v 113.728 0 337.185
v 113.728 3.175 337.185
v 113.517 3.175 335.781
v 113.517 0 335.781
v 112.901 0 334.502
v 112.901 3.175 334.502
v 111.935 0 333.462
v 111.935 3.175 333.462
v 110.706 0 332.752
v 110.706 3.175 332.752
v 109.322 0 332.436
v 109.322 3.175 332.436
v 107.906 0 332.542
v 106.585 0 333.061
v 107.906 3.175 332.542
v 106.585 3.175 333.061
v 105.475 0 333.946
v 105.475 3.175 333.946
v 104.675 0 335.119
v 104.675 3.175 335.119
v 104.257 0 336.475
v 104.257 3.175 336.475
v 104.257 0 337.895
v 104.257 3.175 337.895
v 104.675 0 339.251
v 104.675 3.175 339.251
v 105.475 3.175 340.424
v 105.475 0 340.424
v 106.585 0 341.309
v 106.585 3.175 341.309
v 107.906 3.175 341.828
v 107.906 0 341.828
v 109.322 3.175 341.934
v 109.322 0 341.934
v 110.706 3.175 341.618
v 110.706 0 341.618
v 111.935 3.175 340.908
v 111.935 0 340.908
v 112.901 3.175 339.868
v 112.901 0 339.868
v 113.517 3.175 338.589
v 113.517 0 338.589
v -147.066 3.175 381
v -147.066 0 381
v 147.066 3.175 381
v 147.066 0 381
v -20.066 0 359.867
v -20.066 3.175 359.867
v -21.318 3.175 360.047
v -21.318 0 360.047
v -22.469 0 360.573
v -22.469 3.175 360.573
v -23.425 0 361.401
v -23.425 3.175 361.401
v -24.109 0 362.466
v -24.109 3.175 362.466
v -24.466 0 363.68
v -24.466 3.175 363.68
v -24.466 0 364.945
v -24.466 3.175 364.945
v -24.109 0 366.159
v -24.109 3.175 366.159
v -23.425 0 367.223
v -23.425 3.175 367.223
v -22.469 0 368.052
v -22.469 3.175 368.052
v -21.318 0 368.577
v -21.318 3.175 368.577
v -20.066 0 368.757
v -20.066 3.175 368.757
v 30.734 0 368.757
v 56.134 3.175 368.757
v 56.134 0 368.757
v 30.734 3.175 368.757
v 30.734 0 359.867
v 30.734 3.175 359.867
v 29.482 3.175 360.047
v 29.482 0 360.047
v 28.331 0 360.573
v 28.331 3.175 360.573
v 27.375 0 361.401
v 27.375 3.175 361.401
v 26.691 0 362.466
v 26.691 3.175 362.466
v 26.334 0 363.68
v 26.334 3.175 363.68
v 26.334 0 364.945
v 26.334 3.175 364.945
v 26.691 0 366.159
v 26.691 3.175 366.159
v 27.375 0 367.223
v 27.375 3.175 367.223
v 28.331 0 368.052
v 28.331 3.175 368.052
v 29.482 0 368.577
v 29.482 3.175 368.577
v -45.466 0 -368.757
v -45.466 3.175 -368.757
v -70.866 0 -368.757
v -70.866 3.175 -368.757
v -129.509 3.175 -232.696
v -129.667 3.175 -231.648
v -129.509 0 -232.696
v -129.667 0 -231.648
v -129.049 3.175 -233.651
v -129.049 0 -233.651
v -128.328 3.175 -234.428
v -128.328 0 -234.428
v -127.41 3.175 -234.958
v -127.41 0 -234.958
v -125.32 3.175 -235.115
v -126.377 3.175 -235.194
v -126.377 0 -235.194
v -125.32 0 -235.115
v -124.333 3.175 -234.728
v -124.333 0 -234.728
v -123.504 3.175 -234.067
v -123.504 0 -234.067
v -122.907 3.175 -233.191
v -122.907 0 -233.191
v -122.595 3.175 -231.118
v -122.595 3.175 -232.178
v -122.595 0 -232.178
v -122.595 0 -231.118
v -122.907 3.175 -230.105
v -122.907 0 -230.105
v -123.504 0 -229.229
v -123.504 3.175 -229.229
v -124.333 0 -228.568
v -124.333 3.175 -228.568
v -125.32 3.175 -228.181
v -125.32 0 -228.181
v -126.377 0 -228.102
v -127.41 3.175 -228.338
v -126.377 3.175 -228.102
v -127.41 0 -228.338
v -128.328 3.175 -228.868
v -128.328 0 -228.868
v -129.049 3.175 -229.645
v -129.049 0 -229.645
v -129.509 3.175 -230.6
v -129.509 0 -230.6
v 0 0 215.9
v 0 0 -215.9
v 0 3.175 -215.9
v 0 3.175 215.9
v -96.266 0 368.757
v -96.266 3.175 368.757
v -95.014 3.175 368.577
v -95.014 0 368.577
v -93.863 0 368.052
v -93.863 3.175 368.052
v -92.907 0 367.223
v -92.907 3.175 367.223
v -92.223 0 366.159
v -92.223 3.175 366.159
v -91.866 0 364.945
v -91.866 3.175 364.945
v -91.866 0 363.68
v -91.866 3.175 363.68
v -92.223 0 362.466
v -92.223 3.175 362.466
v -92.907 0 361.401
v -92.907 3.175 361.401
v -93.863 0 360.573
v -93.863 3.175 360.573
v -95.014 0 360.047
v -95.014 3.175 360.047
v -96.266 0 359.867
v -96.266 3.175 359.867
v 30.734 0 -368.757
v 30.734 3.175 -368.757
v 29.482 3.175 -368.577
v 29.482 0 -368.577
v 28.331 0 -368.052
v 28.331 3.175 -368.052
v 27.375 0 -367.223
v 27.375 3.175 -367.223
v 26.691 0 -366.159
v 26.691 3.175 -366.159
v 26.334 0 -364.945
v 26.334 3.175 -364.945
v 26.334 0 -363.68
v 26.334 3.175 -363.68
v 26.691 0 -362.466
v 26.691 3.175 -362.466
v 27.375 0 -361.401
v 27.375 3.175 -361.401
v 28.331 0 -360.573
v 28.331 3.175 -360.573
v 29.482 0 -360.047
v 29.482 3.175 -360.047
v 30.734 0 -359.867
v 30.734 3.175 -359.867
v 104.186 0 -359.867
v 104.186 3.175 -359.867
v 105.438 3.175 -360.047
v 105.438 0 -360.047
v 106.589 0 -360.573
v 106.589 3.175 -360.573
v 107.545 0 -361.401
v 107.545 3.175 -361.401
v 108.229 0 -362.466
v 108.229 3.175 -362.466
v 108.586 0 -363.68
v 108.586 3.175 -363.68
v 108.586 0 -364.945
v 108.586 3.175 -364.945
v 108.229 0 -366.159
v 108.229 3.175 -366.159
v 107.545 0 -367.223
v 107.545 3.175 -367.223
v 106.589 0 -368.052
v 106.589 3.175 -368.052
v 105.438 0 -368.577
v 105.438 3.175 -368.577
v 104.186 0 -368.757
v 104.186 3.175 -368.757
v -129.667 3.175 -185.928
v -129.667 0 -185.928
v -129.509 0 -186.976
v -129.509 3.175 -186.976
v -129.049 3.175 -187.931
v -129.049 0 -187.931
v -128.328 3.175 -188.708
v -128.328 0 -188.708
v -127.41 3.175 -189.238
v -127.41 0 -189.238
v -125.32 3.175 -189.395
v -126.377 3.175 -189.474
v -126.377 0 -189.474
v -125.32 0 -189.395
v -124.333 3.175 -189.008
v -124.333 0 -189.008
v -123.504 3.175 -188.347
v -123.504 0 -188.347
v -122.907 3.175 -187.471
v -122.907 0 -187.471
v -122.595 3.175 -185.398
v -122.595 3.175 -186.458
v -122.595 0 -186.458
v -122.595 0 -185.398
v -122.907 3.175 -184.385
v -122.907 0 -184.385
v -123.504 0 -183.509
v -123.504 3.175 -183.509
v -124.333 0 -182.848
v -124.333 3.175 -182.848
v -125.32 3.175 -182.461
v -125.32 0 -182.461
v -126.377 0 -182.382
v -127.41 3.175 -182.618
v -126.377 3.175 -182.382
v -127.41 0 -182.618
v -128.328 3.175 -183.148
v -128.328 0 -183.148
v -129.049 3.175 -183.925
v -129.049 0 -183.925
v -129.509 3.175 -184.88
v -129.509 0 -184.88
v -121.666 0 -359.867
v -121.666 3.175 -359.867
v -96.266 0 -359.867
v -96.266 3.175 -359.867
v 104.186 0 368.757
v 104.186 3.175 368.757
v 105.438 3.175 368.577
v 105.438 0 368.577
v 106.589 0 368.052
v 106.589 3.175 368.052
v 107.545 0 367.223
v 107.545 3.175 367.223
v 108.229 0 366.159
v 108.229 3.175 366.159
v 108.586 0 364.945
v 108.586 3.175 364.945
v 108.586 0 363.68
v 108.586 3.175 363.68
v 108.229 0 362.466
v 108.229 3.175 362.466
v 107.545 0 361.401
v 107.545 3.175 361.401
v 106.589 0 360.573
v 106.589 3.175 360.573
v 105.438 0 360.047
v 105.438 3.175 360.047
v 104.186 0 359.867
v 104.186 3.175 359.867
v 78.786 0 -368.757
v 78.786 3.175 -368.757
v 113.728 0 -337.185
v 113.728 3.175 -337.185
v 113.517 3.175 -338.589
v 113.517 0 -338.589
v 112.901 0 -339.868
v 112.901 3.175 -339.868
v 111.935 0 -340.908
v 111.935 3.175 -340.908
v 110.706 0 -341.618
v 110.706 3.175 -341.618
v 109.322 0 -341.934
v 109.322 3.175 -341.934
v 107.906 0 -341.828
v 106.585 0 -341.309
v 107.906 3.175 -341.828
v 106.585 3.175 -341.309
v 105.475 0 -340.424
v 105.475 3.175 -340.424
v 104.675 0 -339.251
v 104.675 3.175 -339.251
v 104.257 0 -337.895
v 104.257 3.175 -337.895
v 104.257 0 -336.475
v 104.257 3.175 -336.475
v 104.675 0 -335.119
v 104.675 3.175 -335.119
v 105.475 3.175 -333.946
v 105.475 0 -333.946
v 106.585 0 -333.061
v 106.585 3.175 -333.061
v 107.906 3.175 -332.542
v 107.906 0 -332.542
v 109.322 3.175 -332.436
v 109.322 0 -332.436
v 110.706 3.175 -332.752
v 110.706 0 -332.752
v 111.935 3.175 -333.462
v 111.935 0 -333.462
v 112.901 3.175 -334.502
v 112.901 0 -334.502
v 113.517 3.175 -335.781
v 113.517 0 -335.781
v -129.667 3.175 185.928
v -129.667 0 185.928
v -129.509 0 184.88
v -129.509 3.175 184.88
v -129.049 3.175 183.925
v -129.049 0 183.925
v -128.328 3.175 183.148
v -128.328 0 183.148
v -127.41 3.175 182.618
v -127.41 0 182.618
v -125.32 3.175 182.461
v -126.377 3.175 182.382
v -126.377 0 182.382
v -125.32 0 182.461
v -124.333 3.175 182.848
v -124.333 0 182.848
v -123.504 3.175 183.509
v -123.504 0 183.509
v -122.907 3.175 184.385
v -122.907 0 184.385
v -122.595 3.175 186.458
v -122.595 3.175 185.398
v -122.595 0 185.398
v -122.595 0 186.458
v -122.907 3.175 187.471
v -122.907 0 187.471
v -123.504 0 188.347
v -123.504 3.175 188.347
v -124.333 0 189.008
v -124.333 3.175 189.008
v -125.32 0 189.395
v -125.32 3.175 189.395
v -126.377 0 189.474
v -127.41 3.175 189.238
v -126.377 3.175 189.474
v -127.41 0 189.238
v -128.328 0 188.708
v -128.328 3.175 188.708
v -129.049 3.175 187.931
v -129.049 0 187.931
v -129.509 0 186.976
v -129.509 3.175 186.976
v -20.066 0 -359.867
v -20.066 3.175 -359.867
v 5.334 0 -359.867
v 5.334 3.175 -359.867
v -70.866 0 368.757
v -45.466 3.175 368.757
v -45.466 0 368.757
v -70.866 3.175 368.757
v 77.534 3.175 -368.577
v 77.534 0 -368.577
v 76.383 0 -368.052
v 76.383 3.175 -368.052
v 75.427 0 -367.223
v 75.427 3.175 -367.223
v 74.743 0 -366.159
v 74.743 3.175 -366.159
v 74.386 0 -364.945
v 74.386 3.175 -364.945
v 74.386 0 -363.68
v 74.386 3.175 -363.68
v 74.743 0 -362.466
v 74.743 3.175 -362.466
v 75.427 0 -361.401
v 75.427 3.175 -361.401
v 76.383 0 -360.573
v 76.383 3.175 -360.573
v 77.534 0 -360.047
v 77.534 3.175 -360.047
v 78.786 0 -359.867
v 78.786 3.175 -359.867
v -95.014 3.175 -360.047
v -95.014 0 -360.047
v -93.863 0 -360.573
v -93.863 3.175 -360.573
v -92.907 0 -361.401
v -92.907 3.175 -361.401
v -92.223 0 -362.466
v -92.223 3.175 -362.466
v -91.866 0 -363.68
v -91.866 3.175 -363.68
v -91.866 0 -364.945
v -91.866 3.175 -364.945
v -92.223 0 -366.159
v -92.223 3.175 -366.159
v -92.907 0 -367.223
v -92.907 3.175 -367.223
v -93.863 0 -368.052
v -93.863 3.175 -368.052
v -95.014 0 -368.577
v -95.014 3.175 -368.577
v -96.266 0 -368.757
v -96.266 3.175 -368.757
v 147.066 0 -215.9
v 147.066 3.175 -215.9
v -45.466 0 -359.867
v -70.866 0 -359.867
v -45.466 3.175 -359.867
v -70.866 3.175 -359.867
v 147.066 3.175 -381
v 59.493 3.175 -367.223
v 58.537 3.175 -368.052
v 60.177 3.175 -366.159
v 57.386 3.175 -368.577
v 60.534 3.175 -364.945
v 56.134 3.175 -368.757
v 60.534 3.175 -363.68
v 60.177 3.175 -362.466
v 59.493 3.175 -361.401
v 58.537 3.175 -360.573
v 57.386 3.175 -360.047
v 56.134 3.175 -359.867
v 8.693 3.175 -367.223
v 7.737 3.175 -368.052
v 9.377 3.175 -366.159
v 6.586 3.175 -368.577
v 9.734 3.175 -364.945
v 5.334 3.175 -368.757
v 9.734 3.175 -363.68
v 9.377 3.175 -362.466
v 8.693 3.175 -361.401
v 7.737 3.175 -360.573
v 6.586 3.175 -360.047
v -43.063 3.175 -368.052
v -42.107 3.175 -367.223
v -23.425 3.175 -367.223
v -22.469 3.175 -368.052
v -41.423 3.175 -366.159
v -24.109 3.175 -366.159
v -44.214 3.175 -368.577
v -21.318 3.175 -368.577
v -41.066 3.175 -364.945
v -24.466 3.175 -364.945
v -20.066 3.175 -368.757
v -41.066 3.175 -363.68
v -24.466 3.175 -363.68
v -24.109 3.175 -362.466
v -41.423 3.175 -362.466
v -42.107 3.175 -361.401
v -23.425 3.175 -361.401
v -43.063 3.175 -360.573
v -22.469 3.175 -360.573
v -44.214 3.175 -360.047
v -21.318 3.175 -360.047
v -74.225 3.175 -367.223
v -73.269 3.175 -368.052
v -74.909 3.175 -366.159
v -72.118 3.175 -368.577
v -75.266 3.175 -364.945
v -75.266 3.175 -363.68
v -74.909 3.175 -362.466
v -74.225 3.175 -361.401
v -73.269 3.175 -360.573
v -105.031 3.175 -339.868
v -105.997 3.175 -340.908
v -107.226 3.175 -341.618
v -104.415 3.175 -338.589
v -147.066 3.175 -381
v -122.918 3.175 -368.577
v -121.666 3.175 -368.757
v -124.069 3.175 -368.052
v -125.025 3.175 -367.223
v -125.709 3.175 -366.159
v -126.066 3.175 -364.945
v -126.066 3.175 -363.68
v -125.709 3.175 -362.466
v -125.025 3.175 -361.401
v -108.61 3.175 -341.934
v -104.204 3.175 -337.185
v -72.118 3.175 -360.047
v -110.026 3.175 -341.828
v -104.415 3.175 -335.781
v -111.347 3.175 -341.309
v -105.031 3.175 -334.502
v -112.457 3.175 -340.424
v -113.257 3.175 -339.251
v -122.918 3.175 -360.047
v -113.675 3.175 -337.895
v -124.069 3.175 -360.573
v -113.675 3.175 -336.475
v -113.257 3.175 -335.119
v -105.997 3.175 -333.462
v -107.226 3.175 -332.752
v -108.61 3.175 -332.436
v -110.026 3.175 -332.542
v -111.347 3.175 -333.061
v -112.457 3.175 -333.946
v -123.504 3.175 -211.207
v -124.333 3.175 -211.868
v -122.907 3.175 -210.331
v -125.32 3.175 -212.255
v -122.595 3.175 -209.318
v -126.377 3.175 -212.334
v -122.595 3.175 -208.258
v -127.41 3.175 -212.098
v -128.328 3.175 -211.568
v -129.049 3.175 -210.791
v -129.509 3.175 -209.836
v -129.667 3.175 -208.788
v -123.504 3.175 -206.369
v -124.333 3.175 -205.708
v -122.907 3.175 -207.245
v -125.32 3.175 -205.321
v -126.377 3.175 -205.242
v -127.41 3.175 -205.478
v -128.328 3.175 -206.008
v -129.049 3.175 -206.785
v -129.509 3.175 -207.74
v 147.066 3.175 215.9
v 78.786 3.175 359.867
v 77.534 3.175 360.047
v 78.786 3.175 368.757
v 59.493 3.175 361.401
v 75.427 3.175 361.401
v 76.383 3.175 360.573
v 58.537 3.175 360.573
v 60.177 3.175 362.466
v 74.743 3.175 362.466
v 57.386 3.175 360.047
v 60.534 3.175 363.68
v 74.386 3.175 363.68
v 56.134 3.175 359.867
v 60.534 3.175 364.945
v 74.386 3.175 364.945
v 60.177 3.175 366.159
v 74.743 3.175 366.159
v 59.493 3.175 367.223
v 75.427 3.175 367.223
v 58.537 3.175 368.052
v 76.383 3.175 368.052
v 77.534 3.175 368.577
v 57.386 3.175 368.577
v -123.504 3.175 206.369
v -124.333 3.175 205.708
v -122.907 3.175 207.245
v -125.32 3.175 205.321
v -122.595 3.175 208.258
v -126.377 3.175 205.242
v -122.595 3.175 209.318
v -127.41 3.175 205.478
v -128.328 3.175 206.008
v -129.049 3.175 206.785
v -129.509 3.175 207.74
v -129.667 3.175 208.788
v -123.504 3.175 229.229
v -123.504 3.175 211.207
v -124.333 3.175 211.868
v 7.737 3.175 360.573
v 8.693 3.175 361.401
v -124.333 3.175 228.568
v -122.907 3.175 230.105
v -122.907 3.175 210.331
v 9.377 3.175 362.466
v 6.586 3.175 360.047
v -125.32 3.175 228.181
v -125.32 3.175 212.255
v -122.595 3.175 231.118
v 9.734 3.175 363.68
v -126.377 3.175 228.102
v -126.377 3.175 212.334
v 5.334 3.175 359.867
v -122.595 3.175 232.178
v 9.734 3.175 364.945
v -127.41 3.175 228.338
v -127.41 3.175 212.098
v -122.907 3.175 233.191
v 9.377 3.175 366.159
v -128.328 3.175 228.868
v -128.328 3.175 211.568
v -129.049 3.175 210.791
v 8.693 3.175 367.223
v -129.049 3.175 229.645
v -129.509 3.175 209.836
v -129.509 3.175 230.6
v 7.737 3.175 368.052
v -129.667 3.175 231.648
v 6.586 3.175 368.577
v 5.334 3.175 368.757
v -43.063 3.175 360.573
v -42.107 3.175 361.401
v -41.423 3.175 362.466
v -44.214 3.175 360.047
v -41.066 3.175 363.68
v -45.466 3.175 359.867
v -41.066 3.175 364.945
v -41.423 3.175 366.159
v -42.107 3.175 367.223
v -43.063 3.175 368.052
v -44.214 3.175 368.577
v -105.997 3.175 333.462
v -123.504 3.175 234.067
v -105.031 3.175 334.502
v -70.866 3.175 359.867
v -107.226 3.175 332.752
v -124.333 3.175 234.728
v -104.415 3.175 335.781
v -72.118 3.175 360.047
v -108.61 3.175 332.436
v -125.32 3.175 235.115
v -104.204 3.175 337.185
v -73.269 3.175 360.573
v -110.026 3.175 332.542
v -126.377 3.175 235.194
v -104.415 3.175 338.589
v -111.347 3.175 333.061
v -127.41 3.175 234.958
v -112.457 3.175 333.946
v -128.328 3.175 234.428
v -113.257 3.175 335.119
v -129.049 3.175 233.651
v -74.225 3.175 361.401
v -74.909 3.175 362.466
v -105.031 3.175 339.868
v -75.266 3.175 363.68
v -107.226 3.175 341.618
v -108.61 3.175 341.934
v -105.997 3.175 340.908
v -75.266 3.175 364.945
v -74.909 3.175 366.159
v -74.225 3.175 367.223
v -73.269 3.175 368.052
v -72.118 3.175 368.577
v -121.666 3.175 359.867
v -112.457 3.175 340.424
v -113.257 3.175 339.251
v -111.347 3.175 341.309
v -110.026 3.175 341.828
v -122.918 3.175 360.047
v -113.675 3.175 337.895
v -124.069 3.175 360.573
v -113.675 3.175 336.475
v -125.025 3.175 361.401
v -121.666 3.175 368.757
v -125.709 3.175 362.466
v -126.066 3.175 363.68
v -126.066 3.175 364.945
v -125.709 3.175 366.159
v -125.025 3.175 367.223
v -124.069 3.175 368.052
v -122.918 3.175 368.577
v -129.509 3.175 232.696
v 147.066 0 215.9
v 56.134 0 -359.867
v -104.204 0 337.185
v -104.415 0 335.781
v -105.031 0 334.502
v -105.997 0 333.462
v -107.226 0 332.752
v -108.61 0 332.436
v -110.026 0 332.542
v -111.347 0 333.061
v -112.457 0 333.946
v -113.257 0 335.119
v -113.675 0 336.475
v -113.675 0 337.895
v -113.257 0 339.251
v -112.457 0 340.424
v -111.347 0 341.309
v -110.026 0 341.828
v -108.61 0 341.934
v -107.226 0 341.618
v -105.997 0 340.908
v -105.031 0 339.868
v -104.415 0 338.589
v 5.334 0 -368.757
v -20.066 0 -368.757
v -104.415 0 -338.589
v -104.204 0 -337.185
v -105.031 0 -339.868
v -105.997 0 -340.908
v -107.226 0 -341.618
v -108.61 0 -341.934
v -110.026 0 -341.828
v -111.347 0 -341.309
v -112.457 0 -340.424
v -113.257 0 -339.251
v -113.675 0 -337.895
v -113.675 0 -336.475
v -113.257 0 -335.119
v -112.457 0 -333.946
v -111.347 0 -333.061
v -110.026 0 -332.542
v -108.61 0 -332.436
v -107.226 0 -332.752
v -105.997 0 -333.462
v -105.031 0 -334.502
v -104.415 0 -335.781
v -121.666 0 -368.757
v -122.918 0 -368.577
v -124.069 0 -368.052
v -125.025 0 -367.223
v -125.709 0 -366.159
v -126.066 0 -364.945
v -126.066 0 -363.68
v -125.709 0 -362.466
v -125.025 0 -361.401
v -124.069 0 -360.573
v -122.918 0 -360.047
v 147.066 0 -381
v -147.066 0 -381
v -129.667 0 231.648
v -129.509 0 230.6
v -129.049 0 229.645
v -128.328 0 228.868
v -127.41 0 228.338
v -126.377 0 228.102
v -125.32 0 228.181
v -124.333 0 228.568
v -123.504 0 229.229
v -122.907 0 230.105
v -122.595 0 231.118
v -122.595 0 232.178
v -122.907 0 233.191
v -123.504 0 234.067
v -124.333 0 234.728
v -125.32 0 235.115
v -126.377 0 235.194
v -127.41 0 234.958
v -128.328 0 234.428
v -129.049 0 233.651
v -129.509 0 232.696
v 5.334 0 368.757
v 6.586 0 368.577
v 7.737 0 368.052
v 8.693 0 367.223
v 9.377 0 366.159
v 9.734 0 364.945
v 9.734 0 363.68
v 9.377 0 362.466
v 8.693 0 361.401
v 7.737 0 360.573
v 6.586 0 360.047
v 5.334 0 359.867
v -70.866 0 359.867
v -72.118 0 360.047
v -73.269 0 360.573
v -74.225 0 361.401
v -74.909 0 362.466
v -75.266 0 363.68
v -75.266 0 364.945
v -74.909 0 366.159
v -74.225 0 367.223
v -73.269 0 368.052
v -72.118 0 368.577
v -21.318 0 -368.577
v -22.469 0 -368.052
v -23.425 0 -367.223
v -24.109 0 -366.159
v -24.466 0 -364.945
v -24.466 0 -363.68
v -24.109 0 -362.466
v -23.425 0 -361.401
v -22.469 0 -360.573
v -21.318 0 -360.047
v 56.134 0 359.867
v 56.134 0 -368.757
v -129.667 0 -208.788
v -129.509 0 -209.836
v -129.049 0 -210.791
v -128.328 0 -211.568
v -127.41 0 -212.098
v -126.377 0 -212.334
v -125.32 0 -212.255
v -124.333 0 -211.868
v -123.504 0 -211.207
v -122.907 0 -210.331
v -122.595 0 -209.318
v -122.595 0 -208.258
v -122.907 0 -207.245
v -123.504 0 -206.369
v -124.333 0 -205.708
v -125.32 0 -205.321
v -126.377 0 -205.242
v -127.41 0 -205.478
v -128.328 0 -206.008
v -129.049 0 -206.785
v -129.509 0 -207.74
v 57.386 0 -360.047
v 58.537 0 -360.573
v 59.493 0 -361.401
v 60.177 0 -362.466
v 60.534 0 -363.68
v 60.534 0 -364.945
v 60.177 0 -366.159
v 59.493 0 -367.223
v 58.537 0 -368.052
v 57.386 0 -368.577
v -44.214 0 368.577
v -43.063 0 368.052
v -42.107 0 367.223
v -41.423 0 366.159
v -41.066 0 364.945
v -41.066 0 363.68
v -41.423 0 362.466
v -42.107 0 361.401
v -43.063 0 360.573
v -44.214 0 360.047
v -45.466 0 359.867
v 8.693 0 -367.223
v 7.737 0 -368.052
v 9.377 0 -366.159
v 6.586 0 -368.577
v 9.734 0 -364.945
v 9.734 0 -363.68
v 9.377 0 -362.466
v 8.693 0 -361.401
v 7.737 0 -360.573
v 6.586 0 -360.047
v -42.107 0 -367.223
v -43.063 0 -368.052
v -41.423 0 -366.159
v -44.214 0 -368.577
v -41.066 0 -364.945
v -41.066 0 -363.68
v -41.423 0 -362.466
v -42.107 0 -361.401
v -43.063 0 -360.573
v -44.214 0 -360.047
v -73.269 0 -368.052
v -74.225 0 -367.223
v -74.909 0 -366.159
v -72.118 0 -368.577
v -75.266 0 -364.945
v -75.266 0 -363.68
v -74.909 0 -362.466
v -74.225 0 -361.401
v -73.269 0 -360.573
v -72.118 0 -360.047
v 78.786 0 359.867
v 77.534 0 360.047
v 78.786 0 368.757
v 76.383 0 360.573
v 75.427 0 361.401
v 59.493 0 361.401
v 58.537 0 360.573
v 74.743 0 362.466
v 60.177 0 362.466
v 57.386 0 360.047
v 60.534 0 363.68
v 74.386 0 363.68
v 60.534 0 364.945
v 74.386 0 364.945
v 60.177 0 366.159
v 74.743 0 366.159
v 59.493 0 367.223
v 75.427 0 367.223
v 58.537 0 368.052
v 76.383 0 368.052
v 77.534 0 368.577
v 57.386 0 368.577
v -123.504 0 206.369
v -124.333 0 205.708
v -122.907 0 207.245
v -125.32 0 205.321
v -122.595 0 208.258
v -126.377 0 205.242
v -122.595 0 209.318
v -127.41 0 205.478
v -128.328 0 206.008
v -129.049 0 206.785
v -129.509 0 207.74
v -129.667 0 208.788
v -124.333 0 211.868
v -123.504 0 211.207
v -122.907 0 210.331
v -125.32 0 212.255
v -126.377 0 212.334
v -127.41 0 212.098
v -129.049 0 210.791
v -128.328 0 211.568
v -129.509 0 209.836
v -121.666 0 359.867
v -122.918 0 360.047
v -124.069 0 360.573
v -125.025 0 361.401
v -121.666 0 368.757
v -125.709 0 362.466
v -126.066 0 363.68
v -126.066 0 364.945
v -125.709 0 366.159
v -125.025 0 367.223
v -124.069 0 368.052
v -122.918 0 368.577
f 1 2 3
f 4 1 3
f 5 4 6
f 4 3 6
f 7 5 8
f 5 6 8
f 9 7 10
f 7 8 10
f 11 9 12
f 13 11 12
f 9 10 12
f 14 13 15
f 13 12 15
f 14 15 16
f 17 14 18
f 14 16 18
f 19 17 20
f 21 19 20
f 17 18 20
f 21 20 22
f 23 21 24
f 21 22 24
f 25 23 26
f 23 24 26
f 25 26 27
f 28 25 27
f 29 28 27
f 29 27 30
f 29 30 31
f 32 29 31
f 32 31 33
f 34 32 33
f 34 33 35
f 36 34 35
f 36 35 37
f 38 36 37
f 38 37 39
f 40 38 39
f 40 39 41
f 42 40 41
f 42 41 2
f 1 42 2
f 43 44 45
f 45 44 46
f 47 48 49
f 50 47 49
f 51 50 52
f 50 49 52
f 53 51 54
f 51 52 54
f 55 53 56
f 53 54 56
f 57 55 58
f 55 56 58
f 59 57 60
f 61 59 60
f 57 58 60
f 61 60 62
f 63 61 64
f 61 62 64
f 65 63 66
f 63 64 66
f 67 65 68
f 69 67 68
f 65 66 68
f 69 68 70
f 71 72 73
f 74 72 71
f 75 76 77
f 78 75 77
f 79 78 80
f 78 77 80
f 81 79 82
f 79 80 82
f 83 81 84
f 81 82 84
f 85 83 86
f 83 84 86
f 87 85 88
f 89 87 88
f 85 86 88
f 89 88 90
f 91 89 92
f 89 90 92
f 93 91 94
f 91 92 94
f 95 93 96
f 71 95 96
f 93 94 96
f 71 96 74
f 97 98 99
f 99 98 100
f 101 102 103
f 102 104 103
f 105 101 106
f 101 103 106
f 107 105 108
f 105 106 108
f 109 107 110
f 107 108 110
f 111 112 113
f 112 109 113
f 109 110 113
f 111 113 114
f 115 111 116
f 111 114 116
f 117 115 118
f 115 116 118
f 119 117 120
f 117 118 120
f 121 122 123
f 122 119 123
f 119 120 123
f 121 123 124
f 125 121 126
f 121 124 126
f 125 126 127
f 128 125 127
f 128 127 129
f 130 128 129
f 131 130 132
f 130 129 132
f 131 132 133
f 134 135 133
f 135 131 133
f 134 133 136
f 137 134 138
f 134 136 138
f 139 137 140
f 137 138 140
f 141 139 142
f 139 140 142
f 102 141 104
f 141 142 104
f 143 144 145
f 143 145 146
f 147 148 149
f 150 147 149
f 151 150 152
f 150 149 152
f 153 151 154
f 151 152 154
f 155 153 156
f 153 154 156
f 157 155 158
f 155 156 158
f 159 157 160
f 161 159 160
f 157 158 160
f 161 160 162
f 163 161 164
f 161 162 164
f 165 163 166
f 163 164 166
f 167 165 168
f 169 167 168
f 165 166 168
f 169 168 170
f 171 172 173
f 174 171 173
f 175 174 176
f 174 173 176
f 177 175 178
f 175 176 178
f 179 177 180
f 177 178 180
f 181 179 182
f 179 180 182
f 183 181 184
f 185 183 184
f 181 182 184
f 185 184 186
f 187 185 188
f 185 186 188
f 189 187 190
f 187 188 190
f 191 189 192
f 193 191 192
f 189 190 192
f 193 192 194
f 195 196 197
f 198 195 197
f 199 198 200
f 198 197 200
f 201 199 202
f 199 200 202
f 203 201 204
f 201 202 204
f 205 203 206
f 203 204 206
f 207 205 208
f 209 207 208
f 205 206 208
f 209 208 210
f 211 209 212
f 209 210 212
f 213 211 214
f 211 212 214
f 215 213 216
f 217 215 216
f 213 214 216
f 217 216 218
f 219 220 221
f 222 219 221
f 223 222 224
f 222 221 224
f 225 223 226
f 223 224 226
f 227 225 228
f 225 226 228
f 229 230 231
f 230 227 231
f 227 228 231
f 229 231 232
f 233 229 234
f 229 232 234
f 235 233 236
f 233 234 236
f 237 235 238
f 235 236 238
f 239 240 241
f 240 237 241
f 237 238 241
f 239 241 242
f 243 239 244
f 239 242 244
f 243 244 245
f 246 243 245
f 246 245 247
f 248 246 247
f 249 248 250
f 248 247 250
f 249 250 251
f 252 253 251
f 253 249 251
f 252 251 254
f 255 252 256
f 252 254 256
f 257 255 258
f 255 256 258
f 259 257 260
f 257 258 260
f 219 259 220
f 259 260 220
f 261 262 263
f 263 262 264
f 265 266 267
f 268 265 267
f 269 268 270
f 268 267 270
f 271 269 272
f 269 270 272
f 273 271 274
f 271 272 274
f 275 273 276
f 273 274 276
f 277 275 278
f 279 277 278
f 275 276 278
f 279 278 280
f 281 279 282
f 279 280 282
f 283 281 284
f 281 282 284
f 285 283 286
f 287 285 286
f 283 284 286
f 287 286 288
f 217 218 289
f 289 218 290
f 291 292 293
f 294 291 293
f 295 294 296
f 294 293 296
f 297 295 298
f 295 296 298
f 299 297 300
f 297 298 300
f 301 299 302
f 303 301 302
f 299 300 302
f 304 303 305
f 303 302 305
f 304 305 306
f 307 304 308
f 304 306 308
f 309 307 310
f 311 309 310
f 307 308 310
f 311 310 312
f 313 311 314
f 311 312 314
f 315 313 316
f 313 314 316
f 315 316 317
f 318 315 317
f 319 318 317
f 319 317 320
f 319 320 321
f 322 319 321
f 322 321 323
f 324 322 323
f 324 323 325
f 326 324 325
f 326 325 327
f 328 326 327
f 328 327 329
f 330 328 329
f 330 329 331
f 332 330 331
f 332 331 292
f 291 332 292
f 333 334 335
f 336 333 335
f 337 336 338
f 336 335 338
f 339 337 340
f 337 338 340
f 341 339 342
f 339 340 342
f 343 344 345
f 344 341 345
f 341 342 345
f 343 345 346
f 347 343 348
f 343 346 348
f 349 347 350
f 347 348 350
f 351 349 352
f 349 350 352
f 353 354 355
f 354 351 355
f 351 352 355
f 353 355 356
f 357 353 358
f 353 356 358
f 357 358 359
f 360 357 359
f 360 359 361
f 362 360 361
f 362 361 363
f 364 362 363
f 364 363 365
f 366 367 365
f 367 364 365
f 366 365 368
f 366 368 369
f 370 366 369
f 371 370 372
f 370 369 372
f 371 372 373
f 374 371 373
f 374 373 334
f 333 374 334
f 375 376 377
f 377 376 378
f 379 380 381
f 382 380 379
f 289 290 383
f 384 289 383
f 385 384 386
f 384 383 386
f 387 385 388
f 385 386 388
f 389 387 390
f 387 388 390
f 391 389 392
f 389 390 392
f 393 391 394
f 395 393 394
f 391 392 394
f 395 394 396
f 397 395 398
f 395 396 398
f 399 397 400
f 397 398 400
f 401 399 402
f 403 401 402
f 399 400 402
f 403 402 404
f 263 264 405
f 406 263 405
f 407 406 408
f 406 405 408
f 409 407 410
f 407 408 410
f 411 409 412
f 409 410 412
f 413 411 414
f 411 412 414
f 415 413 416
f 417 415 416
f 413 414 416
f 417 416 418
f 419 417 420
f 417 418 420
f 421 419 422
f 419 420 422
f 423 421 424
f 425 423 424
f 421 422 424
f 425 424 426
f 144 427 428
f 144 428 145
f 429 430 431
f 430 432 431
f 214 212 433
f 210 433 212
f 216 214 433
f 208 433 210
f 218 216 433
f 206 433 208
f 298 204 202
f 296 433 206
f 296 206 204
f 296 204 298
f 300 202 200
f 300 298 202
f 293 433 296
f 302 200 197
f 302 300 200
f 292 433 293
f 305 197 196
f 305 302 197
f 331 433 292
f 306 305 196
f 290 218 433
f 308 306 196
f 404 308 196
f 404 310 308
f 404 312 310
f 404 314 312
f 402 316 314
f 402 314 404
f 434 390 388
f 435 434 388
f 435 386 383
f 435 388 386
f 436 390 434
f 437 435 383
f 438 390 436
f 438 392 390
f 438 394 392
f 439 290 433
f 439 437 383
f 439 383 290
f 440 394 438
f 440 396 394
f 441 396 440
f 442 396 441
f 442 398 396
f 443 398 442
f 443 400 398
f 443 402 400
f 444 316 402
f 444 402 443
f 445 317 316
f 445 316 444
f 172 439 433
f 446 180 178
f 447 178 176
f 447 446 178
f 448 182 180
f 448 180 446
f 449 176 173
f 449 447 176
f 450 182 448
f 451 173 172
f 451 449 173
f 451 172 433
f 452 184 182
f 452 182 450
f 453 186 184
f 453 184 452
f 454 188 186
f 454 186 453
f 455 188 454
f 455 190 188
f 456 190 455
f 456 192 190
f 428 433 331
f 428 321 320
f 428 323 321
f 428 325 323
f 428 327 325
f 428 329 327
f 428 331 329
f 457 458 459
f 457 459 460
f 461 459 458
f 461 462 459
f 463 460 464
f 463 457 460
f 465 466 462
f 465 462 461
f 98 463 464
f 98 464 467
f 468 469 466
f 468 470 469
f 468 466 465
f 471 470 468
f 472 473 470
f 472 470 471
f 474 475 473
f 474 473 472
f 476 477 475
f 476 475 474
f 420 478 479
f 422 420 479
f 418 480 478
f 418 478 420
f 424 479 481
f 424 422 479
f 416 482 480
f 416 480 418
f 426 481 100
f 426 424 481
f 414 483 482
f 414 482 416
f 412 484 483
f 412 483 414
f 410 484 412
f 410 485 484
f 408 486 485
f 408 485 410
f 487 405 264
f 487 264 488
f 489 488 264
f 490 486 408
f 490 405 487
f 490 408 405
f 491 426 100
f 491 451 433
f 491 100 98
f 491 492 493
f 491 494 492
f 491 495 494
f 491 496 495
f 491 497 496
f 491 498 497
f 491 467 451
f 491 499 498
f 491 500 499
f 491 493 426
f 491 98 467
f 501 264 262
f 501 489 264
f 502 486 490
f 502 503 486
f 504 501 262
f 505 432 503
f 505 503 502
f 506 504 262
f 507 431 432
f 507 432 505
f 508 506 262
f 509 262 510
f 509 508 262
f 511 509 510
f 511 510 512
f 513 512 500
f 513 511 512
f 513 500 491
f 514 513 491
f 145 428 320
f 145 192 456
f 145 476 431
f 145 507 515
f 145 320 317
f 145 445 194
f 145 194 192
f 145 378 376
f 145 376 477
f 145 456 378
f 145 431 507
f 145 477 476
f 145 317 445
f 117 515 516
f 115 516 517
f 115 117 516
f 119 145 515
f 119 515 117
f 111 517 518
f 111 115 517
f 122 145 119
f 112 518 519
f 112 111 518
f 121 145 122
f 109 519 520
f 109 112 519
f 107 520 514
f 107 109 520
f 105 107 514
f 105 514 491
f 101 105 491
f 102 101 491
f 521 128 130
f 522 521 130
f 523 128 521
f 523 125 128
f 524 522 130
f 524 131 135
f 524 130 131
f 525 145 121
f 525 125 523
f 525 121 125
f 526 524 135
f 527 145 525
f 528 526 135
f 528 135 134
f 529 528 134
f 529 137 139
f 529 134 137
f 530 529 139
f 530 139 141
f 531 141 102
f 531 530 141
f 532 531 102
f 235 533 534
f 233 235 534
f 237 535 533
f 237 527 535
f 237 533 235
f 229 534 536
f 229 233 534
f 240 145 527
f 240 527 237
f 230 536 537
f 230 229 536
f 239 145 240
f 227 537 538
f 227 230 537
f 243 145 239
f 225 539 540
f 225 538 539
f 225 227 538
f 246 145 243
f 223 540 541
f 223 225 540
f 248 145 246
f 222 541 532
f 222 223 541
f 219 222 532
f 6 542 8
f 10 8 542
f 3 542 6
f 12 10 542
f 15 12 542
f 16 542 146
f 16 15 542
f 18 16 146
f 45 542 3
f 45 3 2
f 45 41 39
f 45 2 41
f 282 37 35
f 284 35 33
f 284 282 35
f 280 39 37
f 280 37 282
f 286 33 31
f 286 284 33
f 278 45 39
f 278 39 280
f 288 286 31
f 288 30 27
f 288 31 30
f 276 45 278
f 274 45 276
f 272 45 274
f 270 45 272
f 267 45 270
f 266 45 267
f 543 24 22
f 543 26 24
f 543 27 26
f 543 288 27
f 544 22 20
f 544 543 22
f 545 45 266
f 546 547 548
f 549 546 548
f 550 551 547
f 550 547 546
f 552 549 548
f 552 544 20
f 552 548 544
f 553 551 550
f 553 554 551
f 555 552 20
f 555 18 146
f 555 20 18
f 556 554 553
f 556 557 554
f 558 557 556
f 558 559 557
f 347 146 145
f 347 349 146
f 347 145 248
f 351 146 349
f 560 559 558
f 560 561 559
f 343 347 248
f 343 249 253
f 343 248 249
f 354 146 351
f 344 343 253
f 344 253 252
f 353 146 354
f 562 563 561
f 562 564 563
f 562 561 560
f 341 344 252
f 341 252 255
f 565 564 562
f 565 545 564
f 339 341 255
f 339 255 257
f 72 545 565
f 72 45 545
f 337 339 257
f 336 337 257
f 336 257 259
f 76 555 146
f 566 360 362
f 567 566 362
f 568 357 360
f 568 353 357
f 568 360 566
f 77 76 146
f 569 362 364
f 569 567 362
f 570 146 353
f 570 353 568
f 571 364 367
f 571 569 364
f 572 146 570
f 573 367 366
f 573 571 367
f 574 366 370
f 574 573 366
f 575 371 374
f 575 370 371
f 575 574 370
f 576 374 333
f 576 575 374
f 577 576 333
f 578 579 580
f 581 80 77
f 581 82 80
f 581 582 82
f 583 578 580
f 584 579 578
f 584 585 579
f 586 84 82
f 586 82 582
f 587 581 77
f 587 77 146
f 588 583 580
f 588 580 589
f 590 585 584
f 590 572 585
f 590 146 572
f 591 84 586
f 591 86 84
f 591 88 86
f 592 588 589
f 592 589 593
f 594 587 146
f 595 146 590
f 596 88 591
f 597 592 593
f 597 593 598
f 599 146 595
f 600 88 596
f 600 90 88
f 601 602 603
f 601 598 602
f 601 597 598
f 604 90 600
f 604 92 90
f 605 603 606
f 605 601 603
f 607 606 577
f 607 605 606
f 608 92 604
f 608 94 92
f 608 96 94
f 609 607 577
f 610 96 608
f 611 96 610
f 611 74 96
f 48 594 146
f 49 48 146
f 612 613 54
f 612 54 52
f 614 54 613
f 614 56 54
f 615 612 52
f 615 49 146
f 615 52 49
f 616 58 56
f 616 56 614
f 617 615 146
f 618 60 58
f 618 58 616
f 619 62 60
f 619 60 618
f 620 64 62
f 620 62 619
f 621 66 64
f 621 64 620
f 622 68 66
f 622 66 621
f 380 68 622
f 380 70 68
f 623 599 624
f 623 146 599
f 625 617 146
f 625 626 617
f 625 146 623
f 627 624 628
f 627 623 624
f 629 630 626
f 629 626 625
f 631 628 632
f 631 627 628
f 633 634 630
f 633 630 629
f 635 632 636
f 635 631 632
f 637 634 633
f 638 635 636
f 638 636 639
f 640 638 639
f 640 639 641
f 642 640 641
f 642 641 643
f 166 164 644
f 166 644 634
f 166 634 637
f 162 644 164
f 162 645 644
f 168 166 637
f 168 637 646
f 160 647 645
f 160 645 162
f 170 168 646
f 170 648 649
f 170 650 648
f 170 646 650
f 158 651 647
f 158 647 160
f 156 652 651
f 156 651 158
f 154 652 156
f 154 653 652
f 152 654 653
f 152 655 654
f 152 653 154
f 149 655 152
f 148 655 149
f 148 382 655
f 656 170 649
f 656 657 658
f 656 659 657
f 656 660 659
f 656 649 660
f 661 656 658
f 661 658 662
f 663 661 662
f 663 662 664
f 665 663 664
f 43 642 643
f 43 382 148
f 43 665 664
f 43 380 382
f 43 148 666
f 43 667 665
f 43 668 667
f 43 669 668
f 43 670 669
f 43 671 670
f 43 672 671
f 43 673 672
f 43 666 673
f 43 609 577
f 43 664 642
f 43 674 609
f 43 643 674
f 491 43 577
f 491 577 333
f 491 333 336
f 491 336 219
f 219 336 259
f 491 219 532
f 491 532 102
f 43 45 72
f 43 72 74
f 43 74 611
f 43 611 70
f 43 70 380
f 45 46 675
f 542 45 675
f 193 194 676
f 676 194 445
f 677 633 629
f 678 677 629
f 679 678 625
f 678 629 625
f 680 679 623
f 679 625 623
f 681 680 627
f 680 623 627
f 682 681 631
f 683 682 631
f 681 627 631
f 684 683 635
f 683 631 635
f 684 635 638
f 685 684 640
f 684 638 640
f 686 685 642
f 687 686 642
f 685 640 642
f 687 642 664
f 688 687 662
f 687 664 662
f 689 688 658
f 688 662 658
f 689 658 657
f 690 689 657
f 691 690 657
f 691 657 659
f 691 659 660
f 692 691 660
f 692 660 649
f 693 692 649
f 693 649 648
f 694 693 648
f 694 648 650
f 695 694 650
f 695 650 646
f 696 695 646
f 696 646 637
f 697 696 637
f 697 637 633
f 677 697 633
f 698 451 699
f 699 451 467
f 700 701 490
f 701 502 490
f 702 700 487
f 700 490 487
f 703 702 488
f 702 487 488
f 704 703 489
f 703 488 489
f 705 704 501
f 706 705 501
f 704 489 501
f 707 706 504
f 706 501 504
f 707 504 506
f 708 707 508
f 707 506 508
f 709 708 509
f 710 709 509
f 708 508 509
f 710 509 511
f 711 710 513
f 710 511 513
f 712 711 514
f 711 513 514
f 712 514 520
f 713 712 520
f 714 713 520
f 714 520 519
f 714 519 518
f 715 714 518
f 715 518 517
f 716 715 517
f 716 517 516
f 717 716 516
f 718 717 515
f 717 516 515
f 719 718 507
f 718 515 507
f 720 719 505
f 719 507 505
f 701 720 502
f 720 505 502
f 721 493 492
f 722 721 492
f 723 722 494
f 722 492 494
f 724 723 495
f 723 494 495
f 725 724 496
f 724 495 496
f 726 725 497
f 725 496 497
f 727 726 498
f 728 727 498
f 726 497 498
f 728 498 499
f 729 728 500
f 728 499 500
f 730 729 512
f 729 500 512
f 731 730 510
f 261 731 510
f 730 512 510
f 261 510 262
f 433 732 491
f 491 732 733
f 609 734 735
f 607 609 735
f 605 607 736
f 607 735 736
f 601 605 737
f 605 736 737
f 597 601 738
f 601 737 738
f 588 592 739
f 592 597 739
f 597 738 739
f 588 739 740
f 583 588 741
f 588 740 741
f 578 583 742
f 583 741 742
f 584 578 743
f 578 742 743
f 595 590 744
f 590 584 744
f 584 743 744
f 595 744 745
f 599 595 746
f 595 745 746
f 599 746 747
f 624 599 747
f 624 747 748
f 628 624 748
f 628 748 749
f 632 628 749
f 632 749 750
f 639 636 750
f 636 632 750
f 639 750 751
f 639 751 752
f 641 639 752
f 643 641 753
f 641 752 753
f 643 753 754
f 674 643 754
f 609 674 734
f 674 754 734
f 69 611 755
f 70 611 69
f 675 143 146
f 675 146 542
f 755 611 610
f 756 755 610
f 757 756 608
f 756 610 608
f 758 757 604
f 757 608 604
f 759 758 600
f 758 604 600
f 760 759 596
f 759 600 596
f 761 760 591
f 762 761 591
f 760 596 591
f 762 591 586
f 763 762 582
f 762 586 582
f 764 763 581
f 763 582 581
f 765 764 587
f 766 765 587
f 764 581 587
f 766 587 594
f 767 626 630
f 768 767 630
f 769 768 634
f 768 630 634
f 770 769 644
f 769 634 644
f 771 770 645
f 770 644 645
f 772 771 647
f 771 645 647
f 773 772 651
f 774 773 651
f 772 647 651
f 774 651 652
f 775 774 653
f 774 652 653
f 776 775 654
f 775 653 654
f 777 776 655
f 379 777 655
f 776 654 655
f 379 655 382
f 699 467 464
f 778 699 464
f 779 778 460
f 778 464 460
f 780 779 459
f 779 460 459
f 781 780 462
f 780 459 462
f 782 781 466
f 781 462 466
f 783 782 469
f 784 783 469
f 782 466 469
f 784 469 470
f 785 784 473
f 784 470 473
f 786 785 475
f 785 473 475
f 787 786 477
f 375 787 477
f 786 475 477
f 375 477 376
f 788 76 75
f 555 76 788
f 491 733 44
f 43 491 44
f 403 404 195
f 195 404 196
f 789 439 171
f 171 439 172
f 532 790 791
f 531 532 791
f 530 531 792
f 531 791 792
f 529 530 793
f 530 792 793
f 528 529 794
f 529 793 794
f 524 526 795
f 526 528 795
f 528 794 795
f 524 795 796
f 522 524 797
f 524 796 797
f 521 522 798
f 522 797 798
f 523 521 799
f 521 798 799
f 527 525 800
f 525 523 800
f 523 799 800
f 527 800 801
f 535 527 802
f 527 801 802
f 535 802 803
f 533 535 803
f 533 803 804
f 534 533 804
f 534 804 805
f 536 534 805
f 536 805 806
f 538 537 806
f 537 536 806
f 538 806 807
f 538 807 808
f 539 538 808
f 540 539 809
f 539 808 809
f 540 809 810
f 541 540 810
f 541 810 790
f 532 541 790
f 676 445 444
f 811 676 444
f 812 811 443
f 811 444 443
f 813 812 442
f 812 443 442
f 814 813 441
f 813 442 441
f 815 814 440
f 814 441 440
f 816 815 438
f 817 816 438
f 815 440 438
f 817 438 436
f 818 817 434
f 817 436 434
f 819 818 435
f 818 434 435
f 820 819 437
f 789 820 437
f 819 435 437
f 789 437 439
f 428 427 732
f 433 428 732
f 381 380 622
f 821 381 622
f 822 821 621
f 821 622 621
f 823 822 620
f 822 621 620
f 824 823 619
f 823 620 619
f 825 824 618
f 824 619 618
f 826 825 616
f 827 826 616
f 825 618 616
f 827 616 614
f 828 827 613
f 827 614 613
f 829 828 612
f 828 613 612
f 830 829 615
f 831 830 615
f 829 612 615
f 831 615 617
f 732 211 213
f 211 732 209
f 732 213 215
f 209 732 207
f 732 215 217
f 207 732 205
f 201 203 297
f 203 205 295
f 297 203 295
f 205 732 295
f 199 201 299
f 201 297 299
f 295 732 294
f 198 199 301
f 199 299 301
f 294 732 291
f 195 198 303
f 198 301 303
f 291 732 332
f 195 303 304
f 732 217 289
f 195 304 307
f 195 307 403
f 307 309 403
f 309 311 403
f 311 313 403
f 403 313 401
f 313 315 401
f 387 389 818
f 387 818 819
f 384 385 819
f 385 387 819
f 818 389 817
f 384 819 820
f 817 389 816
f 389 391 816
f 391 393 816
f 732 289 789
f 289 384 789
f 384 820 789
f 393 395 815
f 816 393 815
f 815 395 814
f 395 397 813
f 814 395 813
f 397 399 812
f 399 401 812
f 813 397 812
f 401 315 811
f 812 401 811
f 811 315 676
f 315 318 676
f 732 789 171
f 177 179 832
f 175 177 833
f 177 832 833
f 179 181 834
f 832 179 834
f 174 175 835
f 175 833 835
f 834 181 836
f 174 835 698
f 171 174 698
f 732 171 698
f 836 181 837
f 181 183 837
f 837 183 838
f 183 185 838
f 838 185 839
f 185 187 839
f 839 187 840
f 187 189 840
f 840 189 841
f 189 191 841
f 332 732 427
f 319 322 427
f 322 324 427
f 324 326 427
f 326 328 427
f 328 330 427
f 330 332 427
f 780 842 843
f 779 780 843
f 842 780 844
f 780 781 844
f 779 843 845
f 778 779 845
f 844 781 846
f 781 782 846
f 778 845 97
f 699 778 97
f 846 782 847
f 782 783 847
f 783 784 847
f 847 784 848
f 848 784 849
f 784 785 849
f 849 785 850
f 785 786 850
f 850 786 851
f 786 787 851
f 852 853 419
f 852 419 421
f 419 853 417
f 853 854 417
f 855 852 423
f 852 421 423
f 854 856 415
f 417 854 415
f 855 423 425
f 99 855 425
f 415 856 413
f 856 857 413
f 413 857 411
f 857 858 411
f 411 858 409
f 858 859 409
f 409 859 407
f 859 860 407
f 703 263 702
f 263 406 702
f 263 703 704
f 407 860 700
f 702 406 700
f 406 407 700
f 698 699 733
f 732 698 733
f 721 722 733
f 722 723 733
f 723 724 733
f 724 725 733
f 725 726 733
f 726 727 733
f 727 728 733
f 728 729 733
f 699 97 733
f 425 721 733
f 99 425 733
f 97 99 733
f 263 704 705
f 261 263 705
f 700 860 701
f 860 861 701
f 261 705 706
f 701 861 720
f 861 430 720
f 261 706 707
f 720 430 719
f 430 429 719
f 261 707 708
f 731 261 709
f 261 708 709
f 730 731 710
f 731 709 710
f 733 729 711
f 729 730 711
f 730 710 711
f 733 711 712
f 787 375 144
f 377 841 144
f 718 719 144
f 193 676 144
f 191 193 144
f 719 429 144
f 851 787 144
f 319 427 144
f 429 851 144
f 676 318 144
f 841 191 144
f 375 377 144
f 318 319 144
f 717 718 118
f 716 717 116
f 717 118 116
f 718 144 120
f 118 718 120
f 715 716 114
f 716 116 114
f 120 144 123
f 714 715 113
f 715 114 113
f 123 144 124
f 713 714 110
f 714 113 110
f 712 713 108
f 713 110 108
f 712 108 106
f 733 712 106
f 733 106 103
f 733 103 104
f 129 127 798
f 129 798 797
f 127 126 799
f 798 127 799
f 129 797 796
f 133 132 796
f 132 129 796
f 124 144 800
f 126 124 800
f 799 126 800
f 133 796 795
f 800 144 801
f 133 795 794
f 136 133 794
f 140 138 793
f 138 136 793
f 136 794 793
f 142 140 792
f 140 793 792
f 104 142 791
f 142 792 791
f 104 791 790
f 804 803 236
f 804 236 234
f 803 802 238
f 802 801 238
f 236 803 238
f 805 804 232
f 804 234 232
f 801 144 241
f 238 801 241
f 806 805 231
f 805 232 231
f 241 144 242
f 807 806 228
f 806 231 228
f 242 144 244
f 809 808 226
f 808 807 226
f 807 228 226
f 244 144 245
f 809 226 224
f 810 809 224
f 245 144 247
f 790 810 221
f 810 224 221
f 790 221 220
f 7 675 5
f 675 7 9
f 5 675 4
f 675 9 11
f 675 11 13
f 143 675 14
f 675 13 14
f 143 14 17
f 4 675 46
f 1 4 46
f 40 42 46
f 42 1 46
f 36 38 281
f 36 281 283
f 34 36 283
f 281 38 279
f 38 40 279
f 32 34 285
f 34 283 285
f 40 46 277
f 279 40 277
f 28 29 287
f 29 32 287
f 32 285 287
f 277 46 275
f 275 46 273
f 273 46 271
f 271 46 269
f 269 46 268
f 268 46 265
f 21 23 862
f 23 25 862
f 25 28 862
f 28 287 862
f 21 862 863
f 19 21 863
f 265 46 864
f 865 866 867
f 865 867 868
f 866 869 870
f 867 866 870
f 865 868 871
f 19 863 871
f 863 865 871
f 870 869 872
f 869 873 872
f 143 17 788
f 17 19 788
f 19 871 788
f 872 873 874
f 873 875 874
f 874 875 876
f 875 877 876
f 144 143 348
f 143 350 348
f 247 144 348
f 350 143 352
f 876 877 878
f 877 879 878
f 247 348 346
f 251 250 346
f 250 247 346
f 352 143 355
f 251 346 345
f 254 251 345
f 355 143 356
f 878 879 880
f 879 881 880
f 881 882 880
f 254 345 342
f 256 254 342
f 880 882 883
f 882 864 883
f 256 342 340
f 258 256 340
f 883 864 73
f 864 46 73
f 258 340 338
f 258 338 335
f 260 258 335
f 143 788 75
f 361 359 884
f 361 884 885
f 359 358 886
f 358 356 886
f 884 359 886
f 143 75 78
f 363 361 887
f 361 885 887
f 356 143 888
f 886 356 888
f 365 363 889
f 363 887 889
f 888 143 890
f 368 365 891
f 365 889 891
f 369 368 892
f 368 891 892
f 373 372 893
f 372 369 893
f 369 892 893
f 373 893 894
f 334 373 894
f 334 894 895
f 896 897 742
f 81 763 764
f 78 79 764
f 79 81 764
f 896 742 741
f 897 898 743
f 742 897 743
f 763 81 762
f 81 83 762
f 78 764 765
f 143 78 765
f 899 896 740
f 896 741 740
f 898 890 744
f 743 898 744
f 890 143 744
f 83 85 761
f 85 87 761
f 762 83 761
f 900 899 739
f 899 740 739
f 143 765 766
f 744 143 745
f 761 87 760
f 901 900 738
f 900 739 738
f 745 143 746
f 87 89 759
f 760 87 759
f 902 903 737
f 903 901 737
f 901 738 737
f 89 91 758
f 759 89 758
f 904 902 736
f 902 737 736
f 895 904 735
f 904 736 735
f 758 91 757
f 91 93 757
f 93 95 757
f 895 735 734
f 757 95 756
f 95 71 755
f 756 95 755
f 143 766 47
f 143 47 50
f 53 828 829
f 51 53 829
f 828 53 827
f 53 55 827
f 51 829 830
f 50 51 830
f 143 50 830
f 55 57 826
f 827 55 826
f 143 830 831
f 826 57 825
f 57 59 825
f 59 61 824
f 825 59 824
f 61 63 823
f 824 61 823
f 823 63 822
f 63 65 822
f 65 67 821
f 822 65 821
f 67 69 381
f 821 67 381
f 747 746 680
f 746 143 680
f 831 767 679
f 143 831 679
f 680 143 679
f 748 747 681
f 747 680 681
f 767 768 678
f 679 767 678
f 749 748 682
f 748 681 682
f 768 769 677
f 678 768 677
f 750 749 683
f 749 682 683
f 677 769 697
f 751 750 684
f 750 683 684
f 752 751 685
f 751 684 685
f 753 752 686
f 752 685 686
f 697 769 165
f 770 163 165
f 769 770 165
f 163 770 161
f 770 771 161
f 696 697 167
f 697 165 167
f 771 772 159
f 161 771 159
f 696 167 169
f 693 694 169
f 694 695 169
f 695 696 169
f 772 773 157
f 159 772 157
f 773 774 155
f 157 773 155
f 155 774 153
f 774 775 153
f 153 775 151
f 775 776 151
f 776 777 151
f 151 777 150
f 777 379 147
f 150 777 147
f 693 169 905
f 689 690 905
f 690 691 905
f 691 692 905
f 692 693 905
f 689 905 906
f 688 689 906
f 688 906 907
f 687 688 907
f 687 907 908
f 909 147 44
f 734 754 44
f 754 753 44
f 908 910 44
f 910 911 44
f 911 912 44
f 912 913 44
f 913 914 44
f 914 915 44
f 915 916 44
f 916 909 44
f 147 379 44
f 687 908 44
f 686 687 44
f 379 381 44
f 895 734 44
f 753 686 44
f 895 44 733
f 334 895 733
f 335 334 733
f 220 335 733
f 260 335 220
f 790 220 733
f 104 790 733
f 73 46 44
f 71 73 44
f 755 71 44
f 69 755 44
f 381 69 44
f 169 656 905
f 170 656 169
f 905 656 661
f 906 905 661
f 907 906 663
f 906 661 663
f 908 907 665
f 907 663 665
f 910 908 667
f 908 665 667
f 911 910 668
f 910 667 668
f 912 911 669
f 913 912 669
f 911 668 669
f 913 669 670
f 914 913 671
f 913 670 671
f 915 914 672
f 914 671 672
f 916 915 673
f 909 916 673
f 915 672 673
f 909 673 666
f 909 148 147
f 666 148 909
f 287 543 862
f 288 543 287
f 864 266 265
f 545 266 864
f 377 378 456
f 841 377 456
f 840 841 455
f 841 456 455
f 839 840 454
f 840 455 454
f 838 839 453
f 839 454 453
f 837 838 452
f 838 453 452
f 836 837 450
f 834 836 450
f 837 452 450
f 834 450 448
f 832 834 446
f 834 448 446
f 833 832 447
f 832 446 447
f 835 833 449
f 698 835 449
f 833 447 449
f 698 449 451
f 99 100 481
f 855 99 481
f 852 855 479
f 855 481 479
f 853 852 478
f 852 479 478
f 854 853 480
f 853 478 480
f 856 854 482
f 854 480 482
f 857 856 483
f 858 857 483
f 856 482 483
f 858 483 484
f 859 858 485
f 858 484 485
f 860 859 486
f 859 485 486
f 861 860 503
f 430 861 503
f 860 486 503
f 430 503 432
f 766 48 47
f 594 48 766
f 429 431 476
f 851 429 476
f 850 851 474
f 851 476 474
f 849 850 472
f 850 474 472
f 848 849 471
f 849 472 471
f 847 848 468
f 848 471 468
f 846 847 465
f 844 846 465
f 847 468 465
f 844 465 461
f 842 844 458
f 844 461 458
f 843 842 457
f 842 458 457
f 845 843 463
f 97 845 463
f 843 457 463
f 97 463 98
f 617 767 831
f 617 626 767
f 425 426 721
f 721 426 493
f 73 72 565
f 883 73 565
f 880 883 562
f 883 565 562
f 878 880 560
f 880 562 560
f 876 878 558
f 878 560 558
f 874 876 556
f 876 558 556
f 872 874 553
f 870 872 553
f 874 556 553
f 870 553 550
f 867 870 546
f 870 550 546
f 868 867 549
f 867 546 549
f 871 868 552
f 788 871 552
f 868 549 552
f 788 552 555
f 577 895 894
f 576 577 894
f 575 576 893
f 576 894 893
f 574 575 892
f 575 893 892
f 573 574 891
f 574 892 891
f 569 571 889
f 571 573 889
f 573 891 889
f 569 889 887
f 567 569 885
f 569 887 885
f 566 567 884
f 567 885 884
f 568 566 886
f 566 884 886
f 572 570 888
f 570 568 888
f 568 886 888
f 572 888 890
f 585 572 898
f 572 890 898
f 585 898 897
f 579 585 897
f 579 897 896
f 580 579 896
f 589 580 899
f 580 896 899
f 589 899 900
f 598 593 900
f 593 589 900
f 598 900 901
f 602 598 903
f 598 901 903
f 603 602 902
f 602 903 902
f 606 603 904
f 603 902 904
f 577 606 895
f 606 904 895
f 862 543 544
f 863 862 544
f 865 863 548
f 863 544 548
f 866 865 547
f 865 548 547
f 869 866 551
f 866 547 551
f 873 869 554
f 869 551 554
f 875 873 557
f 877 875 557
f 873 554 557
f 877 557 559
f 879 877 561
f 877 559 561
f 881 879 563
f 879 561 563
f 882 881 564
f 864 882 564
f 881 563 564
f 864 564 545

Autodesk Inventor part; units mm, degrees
ref_plane "YZ Plane" through (0, 0, 0) normal (1, 0, 0) x (0, 1, 0)
ref_plane "XZ Plane" through (0, 0, 0) normal (0, 1, 0) x (-1, 0, 0)
ref_plane "XY Plane" through (0, 0, 0) normal (0, 0, 1) x (1, 0, 0)
sketch "Sketch1" plane through (0, 0, 0) normal (0, 1, 0) x (-1, 0, 0)
  line L0 (147.066, 381) -> (0, 381)
  line L1 (-147.066, 33.688) -> (-147.066, -381)
  line L2 (-147.066, -381) -> (147.066, -381)
  line L3 (147.066, -381) -> (147.066, 381)
  line L4 (147.066, 381) -> (-147.066, -381) construction
  line L5 (136.271, -185.928) -> (115.951, -185.928) construction
  line L6 (115.951, -185.928) -> (115.951, -231.648) construction
  line L7 (115.951, -231.648) -> (136.271, -231.648) construction
  line L8 (136.271, -231.648) -> (136.271, -185.928) construction
  line L9 (136.271, -185.928) -> (115.951, -231.648) construction
  line L10 (115.951, -185.928) -> (136.271, -231.648) construction
  circle A0 centre (126.111, -231.648) radius 3.556
  circle A1 centre (126.111, -185.928) radius 3.556
  circle A2 centre (126.111, -208.788) radius 3.556
  line L11 (0, 0) -> (147.066, 0) construction
  line L12 (136.271, 231.648) -> (115.951, 231.648) construction
  line L13 (115.951, 231.648) -> (115.951, 185.928) construction
  line L14 (115.951, 185.928) -> (136.271, 185.928) construction
  line L15 (136.271, 185.928) -> (136.271, 231.648) construction
  line L16 (136.271, 231.648) -> (115.951, 185.928) construction
  line L17 (115.951, 231.648) -> (136.271, 185.928) construction
  circle A3 centre (126.111, 231.648) radius 3.556
  circle A4 centre (126.111, 208.788) radius 3.556
  circle A5 centre (126.111, 185.928) radius 3.556
  line L18 (0, 381) -> (-147.066, 381)
  line L19 (-147.066, 381) -> (-147.066, 33.688)
  line L20 (0, 215.9) -> (-147.066, 215.9)
  line L21 (-147.066, 215.9) -> (-147.066, -215.9)
  line L22 (-147.066, -215.9) -> (0, -215.9)
  line L23 (0, -215.9) -> (0, 215.9)
  line L24 (0, 215.9) -> (-147.066, -215.9) construction
  line L25 (-147.066, 215.9) -> (0, -215.9) construction
  point P0 (-73.533, 0)
  dimension "d1" = 294.132
  dimension "d8" = 20.955
  dimension "d9" = 762
  dimension "d10" = 20.32
  dimension "d11" = 45.72
  dimension "d12" = 7.112
  dimension "d13" = 7.112
  dimension "d14" = 7.112
  dimension "d15" = 149.352
  dimension "d16" = 45.72
  dimension "d17" = 149.352
  dimension "d18" = 7.112
  dimension "d19" = 7.112
  dimension "d20" = 7.112
  dimension "d21" = 431.8
  dimension "d22" = 147.066
  dimension "d23" = 0
extrude "Extrusion1" add sketch "Sketch1" along normal blind 3.175 contours L3 L2 L1 L22 L23 L20 L19 L18 L0
sketch "Sketch2" plane through (0, 3.175, 0) normal (0, 1, 0) x (1, 0, 0)
  line L0 (-121.666, 364.3122) -> (-96.266, 364.3122) construction
  line L1 (-121.666, 359.8672) -> (-96.266, 359.8672)
  line L2 (-96.266, 368.7572) -> (-121.666, 368.7572)
  arc A0 (-121.666, 368.7572) -> (-121.666, 359.8672) centre (-121.666, 364.3122) ccw
  arc A1 (-96.266, 359.8672) -> (-96.266, 368.7572) centre (-96.266, 364.3122) ccw
  line L3 (147.066, 381) -> (-147.066, 381) projected
  line L4 (-70.866, 364.3122) -> (-45.466, 364.3122) construction
  line L5 (-70.866, 359.8672) -> (-45.466, 359.8672)
  line L6 (-45.466, 368.7572) -> (-70.866, 368.7572)
  arc A2 (-70.866, 368.7572) -> (-70.866, 359.8672) centre (-70.866, 364.3122) ccw
  arc A3 (-45.466, 359.8672) -> (-45.466, 368.7572) centre (-45.466, 364.3122) ccw
  line L7 (-20.066, 364.3122) -> (5.334, 364.3122) construction
  line L8 (-20.066, 359.8672) -> (5.334, 359.8672)
  line L9 (5.334, 368.7572) -> (-20.066, 368.7572)
  arc A4 (-20.066, 368.7572) -> (-20.066, 359.8672) centre (-20.066, 364.3122) ccw
  arc A5 (5.334, 359.8672) -> (5.334, 368.7572) centre (5.334, 364.3122) ccw
  line L10 (30.734, 364.3122) -> (56.134, 364.3122) construction
  line L11 (30.734, 359.8672) -> (56.134, 359.8672)
  line L12 (56.134, 368.7572) -> (30.734, 368.7572)
  arc A6 (30.734, 368.7572) -> (30.734, 359.8672) centre (30.734, 364.3122) ccw
  arc A7 (56.134, 359.8672) -> (56.134, 368.7572) centre (56.134, 364.3122) ccw
  line L13 (-147.066, 381) -> (-147.066, -381) projected
  line L14 (0, 0) -> (-147.066, 0) construction
  line L15 (-121.666, -364.3122) -> (-96.266, -364.3122) construction
  line L16 (-121.666, -359.8672) -> (-96.266, -359.8672)
  line L17 (-96.266, -368.7572) -> (-121.666, -368.7572)
  arc A8 (-121.666, -359.8672) -> (-121.666, -368.7572) centre (-121.666, -364.3122) ccw
  arc A9 (-96.266, -368.7572) -> (-96.266, -359.8672) centre (-96.266, -364.3122) ccw
  line L18 (-70.866, -364.3122) -> (-45.466, -364.3122) construction
  line L19 (-70.866, -359.8672) -> (-45.466, -359.8672)
  line L20 (-45.466, -368.7572) -> (-70.866, -368.7572)
  arc A10 (-70.866, -359.8672) -> (-70.866, -368.7572) centre (-70.866, -364.3122) ccw
  arc A11 (-45.466, -368.7572) -> (-45.466, -359.8672) centre (-45.466, -364.3122) ccw
  line L21 (-20.066, -364.3122) -> (5.334, -364.3122) construction
  line L22 (-20.066, -359.8672) -> (5.334, -359.8672)
  line L23 (5.334, -368.7572) -> (-20.066, -368.7572)
  arc A12 (-20.066, -359.8672) -> (-20.066, -368.7572) centre (-20.066, -364.3122) ccw
  arc A13 (5.334, -368.7572) -> (5.334, -359.8672) centre (5.334, -364.3122) ccw
  line L24 (30.734, -364.3122) -> (56.134, -364.3122) construction
  line L25 (30.734, -359.8672) -> (56.134, -359.8672)
  line L26 (56.134, -368.7572) -> (30.734, -368.7572)
  arc A14 (30.734, -359.8672) -> (30.734, -368.7572) centre (30.734, -364.3122) ccw
  arc A15 (56.134, -368.7572) -> (56.134, -359.8672) centre (56.134, -364.3122) ccw
  circle A16 centre (-108.966, 337.185) radius 4.7625
  circle A17 centre (108.966, 337.185) radius 4.7625
  line L27 (147.066, 215.9) -> (147.066, 381) projected
  circle A18 centre (-108.966, -337.185) radius 4.7625
  circle A19 centre (108.966, -337.185) radius 4.7625
  line L28 (78.7859, 364.3122) -> (104.1859, 364.3122) construction
  line L29 (78.7859, 359.8672) -> (104.1859, 359.8672)
  line L30 (104.1859, 368.7572) -> (78.7859, 368.7572)
  arc A20 (78.7859, 368.7572) -> (78.7859, 359.8672) centre (78.7859, 364.3122) ccw
  arc A21 (104.1859, 359.8672) -> (104.1859, 368.7572) centre (104.1859, 364.3122) ccw
  line L31 (78.7859, -364.3122) -> (104.1859, -364.3122) construction
  line L32 (78.7859, -359.8672) -> (104.1859, -359.8672)
  line L33 (104.1859, -368.7572) -> (78.7859, -368.7572)
  arc A22 (78.7859, -359.8672) -> (78.7859, -368.7572) centre (78.7859, -364.3122) ccw
  arc A23 (104.1859, -368.7572) -> (104.1859, -359.8672) centre (104.1859, -364.3122) ccw
  point P0 (-108.966, 364.3122)
  point P1 (-58.166, 364.3122)
  point P2 (-7.366, 364.3122)
  point P3 (43.434, 364.3122)
  point P4 (-108.966, -364.3122)
  point P5 (-58.166, -364.3122)
  point P6 (-7.366, -364.3122)
  point P7 (43.434, -364.3122)
  point P8 (91.4859, 364.3122)
  point P9 (91.4859, -364.3122)
  dimension "d24" = 8.89
  dimension "d25" = 16.6878
  dimension "d26" = 25.4
  dimension "d27" = 25.4
  dimension "d28" = 8.89
  dimension "d29" = 25.4
  dimension "d30" = 8.89
  dimension "d31" = 25.4
  dimension "d32" = 8.89
  dimension "d33" = 25.4
  dimension "d34" = 25.4
  dimension "d35" = 25.4
  dimension "d36" = 25.4
  dimension "d42" = 9.525
  dimension "d43" = 43.815
  dimension "d44" = 38.1
  dimension "d45" = 9.525
  dimension "d46" = 43.815
  dimension "d47" = 38.1
  dimension "d48" = 25.4
  dimension "d49" = 4.445
extrude "Extrusion2" cut sketch "Sketch2" against normal blind 3.175
equation "\"d12\" = d13"
equation "\"d14\" = d13"
equation "\"d16\" = d11"
equation "\"d17\" = d15"
equation "\"d18\" = d13"
equation "\"d19\" = d13"
equation "\"d20\" = d13"
equation "\"d27\" = d26"
equation "\"d29\" = d26"
equation "\"d31\" = d26"
equation "\"d33\" = d36"
equation "\"d34\" = d36"
equation "\"d35\" = d36"
equation "\"d45\" = d42"
equation "\"d46\" = d43"
equation "\"d47\" = d44"
equation "\"d48\" = d31"
equation "\"d49\" = 0.5 * d32"
properties part number "lid"
